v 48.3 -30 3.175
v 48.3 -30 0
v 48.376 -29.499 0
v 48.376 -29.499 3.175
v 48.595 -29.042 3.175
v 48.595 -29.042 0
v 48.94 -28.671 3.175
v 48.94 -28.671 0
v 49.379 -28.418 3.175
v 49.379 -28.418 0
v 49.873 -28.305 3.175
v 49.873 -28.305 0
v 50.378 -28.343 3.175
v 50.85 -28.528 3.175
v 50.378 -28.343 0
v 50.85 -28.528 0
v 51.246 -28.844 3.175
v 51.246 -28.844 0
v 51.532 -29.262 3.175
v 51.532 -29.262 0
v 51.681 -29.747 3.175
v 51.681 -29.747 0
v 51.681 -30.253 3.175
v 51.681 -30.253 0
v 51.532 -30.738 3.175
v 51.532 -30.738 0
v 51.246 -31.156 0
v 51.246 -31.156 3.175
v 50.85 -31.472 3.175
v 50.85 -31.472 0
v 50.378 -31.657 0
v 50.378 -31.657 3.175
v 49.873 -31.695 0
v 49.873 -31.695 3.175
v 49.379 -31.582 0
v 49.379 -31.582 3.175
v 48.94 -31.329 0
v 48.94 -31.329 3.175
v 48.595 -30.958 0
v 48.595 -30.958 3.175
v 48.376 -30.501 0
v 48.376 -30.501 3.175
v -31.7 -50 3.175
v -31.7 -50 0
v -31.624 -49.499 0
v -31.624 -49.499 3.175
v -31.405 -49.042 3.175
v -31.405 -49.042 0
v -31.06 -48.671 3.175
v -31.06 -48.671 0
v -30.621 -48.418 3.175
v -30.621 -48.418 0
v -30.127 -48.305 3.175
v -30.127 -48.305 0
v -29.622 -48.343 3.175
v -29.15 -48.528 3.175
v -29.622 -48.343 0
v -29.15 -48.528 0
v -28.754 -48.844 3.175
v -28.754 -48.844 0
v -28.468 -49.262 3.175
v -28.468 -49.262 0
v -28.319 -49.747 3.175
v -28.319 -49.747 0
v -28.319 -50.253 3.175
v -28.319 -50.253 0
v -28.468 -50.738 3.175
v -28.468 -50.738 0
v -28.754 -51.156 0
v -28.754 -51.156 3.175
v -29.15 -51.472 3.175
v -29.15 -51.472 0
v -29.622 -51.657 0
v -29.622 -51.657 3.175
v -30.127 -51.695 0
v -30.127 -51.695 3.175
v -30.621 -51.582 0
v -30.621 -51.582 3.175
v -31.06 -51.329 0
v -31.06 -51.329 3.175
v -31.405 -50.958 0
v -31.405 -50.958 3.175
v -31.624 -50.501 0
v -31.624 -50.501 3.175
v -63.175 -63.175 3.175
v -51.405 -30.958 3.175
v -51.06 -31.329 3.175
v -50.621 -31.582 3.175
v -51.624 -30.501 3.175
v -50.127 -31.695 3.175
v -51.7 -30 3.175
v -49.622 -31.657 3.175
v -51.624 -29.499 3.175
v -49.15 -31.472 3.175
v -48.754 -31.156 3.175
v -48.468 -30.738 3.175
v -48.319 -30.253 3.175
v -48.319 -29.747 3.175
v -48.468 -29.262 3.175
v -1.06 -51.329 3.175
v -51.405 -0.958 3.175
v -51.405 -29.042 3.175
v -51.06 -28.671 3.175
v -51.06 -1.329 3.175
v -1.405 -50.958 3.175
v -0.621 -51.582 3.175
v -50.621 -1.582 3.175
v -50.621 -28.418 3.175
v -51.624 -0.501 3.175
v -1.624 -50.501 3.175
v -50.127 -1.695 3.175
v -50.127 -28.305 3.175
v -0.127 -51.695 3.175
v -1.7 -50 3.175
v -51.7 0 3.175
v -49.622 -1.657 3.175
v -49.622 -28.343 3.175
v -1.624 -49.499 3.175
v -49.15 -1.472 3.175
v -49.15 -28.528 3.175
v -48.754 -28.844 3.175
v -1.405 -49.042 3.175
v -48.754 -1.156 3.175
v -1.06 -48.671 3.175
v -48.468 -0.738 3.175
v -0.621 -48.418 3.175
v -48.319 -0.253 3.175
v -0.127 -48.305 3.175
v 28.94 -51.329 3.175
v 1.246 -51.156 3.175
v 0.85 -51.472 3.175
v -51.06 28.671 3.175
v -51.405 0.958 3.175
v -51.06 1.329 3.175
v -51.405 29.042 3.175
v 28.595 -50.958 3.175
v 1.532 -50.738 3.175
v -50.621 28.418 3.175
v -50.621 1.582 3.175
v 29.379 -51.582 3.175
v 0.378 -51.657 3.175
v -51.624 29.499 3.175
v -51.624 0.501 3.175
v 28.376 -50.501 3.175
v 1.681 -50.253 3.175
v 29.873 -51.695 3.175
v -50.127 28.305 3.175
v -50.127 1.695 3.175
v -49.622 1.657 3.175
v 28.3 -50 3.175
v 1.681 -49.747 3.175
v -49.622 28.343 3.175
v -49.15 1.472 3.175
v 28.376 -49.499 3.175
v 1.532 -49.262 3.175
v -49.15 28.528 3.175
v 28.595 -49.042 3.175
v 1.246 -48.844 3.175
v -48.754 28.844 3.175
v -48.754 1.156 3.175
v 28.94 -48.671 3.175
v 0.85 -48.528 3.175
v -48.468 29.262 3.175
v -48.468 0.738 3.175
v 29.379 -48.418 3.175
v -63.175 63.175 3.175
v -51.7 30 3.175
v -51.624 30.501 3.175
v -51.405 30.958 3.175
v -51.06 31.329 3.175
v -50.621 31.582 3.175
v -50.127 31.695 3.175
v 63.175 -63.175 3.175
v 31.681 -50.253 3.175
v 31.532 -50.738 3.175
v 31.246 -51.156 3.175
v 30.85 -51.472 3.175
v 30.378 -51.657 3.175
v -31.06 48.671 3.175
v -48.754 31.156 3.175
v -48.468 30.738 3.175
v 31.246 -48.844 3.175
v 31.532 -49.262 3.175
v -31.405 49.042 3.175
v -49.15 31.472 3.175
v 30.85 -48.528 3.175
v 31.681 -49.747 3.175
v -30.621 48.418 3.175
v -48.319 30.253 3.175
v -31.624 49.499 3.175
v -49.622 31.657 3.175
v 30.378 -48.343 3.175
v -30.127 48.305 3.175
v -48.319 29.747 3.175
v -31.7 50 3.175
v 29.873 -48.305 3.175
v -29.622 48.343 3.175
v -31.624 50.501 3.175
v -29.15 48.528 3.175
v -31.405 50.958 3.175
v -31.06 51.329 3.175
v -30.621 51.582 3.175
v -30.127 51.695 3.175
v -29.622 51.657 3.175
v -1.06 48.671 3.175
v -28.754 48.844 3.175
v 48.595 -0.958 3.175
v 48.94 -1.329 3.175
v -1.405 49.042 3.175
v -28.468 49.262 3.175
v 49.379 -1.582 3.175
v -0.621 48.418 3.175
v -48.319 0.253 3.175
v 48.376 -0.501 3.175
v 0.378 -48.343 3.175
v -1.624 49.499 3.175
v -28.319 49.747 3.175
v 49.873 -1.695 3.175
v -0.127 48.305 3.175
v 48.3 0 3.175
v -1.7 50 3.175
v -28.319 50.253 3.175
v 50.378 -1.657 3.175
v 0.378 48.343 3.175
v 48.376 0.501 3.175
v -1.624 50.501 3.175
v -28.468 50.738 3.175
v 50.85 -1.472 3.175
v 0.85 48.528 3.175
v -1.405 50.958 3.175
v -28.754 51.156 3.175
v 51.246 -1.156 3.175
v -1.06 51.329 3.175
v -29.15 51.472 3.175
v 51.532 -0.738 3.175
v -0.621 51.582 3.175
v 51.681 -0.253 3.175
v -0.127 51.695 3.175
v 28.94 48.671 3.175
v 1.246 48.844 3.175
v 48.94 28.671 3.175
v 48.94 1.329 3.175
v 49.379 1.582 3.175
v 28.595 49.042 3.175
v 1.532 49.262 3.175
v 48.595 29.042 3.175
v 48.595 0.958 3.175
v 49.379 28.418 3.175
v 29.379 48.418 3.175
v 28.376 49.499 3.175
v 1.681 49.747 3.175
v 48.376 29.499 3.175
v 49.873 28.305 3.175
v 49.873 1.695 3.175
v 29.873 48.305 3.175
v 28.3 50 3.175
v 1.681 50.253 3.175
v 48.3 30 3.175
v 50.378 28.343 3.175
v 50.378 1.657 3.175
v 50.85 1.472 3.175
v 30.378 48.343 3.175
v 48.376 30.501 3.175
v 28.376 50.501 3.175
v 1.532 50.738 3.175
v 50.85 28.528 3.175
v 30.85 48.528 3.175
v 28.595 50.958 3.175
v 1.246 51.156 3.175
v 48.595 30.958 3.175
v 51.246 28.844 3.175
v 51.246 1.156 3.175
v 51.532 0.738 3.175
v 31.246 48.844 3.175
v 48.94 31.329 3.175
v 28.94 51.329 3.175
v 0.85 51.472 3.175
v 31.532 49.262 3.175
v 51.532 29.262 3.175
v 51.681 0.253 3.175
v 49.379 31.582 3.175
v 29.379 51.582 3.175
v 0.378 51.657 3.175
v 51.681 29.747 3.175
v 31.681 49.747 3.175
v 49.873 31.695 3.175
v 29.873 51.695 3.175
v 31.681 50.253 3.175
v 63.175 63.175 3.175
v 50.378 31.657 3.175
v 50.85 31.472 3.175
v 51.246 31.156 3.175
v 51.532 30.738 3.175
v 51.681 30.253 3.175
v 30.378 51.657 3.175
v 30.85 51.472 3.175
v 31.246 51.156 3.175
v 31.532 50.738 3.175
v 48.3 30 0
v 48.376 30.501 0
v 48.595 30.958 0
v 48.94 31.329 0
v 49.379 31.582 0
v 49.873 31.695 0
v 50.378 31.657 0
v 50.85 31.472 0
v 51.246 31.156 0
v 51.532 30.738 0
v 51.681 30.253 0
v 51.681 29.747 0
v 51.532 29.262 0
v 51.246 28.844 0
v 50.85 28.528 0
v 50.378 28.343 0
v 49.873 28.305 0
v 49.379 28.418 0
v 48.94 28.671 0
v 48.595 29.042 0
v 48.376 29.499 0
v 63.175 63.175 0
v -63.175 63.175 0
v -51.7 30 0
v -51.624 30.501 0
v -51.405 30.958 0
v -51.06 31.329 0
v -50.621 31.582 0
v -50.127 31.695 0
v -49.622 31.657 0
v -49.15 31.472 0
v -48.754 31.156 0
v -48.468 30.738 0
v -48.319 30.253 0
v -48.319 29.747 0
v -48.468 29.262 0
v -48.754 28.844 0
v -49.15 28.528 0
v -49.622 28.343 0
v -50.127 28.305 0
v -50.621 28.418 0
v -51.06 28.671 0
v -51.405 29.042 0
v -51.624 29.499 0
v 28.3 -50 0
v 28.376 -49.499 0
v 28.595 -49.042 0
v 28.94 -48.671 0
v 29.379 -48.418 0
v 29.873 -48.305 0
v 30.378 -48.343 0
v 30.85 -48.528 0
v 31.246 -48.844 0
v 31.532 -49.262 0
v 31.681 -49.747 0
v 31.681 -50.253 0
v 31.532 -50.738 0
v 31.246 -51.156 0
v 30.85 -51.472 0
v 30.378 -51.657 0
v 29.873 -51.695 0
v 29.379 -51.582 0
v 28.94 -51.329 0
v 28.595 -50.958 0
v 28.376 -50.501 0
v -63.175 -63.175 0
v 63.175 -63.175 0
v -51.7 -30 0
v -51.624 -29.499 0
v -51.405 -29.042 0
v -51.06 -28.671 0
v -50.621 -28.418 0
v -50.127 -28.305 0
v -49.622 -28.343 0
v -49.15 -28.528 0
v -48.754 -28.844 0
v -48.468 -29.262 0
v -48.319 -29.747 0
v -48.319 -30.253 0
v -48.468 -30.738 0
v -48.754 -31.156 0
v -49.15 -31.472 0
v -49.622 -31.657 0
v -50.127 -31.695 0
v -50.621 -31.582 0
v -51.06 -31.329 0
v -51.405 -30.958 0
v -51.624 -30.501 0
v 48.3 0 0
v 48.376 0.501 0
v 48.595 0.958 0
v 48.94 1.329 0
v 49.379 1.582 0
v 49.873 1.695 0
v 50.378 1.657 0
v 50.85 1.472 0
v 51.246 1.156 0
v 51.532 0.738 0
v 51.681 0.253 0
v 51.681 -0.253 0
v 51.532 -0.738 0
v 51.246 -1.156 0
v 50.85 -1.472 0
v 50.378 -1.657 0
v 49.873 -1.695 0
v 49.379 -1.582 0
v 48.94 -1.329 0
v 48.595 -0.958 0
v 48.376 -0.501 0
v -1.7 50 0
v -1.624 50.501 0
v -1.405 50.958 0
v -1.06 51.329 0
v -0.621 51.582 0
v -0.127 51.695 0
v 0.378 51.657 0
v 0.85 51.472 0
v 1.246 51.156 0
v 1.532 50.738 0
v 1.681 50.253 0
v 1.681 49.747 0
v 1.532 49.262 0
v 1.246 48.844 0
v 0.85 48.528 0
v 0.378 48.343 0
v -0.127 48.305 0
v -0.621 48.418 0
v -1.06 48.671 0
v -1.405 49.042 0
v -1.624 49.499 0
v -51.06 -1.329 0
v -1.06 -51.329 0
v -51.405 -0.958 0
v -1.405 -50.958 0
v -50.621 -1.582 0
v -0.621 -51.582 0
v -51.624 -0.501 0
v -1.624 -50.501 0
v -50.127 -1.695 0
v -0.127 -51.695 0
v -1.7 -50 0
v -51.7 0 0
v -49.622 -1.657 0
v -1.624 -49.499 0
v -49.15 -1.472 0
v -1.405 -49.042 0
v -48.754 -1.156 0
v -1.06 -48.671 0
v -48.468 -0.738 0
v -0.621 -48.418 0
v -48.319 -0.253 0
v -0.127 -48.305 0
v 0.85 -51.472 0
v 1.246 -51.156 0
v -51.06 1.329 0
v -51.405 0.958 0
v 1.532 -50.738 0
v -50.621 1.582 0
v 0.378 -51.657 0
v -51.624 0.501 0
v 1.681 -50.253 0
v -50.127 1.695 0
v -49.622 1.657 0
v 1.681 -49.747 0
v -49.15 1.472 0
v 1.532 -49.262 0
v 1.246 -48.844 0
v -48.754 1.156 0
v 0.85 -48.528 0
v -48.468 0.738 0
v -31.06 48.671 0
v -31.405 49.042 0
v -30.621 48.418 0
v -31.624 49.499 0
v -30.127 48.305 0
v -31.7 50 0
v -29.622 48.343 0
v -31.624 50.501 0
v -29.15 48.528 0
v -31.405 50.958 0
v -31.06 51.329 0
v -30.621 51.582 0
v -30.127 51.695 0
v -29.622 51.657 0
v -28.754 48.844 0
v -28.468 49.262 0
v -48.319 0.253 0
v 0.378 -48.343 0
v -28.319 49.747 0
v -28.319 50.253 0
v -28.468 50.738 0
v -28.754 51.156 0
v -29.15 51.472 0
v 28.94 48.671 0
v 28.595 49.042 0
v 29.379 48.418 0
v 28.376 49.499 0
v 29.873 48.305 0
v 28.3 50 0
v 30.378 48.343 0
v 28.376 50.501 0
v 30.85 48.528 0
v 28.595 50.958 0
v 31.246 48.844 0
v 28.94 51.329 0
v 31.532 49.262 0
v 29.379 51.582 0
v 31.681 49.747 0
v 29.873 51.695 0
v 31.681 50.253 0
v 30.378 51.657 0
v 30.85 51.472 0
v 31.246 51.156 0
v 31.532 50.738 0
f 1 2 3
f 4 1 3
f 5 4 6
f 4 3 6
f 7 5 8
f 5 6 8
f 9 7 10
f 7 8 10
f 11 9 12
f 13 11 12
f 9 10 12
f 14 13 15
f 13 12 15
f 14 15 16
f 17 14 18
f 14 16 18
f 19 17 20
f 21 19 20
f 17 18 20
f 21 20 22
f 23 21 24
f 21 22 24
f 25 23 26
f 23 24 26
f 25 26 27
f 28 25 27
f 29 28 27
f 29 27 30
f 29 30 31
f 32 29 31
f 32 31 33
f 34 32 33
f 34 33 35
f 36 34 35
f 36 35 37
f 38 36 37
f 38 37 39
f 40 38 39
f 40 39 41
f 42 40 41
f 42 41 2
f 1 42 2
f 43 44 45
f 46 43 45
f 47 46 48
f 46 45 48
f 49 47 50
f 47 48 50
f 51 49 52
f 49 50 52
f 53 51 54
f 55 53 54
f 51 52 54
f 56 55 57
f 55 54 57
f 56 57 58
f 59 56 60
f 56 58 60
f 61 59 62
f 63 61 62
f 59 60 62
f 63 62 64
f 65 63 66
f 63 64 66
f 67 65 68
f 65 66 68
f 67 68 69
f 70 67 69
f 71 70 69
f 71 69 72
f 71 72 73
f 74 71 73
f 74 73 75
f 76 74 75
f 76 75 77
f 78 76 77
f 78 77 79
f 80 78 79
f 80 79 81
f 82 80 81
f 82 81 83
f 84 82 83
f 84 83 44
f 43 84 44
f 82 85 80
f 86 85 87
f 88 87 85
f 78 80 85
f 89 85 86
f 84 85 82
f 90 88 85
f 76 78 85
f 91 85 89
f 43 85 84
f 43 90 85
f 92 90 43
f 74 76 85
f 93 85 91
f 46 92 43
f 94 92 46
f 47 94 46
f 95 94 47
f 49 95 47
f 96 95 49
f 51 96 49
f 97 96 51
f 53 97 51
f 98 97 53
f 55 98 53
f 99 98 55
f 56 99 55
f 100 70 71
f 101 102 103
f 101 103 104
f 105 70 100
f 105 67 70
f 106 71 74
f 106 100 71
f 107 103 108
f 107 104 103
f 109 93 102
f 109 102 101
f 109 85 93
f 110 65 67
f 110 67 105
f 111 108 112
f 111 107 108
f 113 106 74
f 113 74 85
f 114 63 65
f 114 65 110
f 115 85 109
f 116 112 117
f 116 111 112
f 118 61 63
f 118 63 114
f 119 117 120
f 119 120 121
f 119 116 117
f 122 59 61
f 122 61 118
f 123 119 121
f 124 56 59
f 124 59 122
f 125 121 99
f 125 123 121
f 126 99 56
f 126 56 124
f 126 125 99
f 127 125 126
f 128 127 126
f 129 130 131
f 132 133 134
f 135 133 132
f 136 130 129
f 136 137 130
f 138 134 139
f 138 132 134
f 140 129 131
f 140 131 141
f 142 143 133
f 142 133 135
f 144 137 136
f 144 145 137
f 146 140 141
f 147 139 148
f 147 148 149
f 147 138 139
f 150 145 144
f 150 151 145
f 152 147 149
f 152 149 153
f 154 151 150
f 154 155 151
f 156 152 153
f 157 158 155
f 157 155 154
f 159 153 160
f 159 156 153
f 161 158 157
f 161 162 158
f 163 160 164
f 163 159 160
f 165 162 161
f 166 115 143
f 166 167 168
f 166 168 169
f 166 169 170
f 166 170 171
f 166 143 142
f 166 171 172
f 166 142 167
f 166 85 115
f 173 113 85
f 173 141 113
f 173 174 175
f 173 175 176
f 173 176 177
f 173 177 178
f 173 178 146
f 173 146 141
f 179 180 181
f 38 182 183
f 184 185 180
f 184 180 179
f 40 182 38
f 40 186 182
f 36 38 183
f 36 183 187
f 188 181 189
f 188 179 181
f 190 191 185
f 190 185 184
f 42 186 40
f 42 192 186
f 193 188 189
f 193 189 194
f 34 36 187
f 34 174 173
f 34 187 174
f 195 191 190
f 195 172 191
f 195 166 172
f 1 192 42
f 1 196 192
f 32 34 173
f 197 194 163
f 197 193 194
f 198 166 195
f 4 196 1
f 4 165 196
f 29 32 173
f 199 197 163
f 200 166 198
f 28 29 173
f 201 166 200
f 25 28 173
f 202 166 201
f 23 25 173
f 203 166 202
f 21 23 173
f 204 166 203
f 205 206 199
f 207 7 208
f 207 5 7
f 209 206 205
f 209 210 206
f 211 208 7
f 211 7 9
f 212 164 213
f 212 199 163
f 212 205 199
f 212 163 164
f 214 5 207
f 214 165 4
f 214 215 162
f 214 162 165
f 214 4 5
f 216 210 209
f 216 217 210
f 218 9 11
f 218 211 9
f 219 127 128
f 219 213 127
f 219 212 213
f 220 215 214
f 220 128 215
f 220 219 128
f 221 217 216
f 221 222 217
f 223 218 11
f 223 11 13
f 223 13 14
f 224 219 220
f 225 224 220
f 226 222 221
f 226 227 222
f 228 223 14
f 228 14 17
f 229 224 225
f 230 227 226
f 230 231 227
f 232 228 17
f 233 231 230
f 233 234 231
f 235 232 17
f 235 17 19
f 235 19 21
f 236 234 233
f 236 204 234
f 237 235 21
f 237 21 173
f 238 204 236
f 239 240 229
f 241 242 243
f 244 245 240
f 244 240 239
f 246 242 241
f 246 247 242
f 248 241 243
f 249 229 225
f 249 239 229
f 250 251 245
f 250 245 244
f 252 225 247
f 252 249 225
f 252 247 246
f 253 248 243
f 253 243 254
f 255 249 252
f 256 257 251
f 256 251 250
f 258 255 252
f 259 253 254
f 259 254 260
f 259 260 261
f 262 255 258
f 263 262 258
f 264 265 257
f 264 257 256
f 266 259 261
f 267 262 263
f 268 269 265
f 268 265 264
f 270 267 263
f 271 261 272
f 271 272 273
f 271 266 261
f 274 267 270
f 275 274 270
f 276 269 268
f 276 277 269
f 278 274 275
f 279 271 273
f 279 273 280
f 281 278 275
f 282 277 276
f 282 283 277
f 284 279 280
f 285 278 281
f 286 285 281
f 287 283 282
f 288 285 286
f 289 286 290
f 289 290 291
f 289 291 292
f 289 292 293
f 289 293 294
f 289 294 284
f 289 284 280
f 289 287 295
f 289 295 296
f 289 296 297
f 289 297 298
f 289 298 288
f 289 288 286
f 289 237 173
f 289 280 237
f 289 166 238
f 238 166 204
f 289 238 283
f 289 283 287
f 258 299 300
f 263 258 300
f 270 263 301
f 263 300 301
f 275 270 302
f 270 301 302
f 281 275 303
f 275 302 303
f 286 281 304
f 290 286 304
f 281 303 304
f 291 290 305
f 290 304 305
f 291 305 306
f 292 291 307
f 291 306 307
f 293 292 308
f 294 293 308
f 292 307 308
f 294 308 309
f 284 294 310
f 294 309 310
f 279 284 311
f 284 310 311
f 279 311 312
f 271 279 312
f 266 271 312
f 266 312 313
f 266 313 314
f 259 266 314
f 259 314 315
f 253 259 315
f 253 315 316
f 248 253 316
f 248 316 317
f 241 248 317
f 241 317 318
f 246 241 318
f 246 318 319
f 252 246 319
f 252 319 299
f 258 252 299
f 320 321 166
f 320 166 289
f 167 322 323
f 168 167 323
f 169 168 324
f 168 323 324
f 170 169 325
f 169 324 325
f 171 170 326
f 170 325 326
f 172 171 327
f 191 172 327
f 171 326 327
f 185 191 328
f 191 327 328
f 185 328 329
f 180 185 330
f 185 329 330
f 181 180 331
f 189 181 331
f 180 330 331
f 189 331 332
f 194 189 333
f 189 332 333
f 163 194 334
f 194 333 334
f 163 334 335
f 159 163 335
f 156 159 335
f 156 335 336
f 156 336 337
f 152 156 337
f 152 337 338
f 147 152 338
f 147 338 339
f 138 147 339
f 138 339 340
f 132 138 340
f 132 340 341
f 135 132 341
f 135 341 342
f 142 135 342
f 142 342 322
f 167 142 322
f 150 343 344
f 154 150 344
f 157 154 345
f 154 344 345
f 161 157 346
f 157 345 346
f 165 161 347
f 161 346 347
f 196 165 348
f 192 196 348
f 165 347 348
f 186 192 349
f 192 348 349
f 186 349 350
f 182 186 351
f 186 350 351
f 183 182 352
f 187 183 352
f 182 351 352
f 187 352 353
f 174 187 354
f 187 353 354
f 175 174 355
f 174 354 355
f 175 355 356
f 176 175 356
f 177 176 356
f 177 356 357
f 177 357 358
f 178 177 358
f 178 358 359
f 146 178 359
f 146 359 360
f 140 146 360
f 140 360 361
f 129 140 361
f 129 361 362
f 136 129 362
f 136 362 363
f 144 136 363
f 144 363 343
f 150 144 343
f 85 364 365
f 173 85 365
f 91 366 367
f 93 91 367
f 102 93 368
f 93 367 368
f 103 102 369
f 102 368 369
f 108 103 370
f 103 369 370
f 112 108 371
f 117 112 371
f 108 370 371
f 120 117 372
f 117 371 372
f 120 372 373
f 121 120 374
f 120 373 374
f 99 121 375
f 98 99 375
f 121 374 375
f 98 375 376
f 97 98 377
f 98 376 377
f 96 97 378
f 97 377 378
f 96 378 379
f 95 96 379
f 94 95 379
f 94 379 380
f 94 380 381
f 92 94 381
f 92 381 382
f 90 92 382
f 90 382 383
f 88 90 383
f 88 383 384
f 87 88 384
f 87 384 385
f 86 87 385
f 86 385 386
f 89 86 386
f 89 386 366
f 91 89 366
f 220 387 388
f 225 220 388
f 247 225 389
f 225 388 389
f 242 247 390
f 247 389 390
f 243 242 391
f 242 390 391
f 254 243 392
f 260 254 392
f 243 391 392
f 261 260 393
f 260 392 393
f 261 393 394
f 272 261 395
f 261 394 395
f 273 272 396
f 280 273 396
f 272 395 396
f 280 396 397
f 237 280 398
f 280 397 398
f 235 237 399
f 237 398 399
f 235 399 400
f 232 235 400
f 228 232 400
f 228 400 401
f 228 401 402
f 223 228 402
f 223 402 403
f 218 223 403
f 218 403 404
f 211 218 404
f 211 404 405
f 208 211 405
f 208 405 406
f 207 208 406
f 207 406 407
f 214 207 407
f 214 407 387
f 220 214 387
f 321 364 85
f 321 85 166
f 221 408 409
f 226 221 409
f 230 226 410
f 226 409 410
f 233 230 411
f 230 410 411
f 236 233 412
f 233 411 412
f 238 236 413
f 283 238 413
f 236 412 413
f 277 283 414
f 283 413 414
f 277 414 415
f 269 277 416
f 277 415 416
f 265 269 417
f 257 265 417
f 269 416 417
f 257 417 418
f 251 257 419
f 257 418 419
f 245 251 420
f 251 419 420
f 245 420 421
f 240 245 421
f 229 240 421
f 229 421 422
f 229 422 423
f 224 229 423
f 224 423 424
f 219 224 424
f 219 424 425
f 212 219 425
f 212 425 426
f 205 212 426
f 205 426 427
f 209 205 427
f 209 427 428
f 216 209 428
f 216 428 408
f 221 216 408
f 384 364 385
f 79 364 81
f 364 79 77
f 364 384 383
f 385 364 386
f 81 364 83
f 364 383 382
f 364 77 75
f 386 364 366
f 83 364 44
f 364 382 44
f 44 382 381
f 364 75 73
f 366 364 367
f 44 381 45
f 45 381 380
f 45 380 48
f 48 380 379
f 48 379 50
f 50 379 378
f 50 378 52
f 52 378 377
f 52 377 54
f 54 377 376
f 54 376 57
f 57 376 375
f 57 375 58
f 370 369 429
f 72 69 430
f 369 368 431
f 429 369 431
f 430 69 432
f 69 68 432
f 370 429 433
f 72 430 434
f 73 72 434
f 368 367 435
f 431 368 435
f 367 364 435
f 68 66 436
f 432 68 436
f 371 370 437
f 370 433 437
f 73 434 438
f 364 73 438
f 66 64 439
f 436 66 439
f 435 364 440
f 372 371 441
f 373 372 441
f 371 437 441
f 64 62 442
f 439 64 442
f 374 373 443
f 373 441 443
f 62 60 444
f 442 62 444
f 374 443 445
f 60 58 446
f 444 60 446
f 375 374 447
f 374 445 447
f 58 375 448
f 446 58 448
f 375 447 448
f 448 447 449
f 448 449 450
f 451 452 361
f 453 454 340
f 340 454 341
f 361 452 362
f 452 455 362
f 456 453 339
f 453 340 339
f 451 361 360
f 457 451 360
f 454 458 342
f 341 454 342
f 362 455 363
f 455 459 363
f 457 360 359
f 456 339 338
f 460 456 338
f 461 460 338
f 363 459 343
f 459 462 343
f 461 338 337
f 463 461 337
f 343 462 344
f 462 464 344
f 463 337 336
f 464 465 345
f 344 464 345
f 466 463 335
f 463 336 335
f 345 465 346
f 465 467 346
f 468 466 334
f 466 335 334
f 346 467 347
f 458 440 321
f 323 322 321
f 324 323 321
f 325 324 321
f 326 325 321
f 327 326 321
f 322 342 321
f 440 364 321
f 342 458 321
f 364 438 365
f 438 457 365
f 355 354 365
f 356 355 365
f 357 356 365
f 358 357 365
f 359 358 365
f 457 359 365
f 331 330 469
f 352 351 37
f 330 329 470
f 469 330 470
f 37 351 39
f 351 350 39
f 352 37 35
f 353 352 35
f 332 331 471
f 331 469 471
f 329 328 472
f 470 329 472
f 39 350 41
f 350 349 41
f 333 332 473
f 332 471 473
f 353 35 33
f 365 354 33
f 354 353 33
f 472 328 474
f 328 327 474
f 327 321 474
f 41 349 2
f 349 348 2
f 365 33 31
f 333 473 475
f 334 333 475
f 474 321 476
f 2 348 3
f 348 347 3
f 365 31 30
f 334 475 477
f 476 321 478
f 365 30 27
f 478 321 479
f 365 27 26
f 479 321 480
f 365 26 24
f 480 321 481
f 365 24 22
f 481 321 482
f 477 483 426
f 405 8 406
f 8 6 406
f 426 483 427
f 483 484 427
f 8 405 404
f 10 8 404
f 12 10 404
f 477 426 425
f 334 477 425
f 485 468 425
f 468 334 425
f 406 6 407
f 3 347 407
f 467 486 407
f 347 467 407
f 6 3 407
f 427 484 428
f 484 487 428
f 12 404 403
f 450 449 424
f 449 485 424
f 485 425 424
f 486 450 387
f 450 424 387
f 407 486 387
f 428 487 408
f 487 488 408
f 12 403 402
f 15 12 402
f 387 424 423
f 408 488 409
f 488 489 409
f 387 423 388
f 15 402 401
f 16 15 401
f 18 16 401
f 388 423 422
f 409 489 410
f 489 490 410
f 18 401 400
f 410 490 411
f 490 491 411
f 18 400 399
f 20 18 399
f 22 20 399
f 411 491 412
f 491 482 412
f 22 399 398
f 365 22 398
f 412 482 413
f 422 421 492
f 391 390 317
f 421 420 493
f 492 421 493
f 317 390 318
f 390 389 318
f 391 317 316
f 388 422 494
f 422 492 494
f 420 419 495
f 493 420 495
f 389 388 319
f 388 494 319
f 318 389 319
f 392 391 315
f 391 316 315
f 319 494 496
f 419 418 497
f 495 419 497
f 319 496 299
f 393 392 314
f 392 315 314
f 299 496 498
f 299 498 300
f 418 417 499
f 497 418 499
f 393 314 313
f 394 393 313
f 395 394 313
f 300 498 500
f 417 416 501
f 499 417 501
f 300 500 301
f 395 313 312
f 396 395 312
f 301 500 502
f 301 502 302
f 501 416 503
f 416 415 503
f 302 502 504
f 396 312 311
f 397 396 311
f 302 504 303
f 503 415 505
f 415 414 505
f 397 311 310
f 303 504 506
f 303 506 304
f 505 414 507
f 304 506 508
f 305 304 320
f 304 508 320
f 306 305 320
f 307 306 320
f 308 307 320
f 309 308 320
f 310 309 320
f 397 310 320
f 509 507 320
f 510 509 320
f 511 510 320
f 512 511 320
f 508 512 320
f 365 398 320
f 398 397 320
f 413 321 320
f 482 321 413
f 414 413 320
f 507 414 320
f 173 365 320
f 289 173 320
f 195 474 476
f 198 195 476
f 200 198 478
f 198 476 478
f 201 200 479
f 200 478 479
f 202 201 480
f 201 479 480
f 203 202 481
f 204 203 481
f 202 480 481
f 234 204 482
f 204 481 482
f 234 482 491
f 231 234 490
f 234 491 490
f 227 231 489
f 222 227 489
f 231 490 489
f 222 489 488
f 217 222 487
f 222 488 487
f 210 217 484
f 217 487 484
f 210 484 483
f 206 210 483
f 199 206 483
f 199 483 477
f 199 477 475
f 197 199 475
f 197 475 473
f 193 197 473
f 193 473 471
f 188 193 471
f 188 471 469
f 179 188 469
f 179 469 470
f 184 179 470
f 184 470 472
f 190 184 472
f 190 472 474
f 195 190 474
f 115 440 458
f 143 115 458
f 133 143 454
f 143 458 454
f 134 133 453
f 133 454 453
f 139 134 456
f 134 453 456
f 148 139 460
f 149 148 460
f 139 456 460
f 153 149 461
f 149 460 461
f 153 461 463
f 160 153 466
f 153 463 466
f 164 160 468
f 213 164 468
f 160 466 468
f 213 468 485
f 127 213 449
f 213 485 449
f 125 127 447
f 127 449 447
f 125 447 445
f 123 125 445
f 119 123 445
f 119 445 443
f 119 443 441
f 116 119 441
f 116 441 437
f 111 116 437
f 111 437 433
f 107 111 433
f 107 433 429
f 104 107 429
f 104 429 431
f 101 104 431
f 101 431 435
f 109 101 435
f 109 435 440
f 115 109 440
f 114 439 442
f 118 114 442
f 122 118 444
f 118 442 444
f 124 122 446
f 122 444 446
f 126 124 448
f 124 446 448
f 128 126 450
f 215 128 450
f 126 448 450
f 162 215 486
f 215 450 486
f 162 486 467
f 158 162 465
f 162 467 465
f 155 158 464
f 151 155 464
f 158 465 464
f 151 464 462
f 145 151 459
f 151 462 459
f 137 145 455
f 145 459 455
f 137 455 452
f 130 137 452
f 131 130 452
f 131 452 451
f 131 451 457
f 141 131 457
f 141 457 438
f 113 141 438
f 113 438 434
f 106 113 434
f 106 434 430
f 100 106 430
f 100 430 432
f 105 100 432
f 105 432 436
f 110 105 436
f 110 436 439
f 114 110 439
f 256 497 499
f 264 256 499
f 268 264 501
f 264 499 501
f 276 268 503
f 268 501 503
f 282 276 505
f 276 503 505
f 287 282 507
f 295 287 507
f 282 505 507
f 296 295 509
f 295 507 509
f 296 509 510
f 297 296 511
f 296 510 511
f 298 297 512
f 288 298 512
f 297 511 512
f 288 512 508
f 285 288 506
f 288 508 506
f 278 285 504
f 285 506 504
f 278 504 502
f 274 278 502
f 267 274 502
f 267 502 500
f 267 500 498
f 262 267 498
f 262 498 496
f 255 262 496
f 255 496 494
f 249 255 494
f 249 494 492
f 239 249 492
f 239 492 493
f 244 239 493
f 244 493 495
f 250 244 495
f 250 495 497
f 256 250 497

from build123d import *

# Parameters (mm, degrees)
SKETCH1_W           = 126.35
SKETCH1_H           = 126.35
BOSS_EXTRUDE1_DEPTH = 3.175
SKETCH2_R           = 1.7
CUT_EXTRUDE1_DEPTH  = 7


with BuildPart() as part:
    # Sketch1 → Boss-Extrude1 (new body)
    with BuildSketch(Plane.XY):
        Rectangle(SKETCH1_W, SKETCH1_H)
    extrude(amount=BOSS_EXTRUDE1_DEPTH)

    # Sketch2 → Cut-Extrude1 (cut)
    with BuildSketch(Plane(origin=(-17.047760395, -31.681970197, 0), x_dir=(-1, 0, 0), z_dir=(0, 0, -1))):
        with Locations((-17.047760395, -18.318029803)):
            Circle(SKETCH2_R)
        with Locations((12.952239605, -18.318029803)):
            Circle(SKETCH2_R)
        with Locations((-47.047760395, -18.318029803)):
            Circle(SKETCH2_R)
        with Locations((-67.047760395, 61.681970197)):
            Circle(SKETCH2_R)
        with Locations((-67.047760395, 31.681970197)):
            Circle(SKETCH2_R)
        with Locations((-67.047760395, 1.681970197)):
            Circle(SKETCH2_R)
        with Locations((12.952239605, 81.681970197)):
            Circle(SKETCH2_R)
        with Locations((-17.047760395, 81.681970197)):
            Circle(SKETCH2_R)
        with Locations((-47.047760395, 81.681970197)):
            Circle(SKETCH2_R)
        with Locations((32.952239605, 1.681970197)):
            Circle(SKETCH2_R)
        with Locations((32.952239605, 31.681970197)):
            Circle(SKETCH2_R)
        with Locations((32.952239605, 61.681970197)):
            Circle(SKETCH2_R)
    extrude(amount=-CUT_EXTRUDE1_DEPTH, mode=Mode.SUBTRACT)


solid = part.part
